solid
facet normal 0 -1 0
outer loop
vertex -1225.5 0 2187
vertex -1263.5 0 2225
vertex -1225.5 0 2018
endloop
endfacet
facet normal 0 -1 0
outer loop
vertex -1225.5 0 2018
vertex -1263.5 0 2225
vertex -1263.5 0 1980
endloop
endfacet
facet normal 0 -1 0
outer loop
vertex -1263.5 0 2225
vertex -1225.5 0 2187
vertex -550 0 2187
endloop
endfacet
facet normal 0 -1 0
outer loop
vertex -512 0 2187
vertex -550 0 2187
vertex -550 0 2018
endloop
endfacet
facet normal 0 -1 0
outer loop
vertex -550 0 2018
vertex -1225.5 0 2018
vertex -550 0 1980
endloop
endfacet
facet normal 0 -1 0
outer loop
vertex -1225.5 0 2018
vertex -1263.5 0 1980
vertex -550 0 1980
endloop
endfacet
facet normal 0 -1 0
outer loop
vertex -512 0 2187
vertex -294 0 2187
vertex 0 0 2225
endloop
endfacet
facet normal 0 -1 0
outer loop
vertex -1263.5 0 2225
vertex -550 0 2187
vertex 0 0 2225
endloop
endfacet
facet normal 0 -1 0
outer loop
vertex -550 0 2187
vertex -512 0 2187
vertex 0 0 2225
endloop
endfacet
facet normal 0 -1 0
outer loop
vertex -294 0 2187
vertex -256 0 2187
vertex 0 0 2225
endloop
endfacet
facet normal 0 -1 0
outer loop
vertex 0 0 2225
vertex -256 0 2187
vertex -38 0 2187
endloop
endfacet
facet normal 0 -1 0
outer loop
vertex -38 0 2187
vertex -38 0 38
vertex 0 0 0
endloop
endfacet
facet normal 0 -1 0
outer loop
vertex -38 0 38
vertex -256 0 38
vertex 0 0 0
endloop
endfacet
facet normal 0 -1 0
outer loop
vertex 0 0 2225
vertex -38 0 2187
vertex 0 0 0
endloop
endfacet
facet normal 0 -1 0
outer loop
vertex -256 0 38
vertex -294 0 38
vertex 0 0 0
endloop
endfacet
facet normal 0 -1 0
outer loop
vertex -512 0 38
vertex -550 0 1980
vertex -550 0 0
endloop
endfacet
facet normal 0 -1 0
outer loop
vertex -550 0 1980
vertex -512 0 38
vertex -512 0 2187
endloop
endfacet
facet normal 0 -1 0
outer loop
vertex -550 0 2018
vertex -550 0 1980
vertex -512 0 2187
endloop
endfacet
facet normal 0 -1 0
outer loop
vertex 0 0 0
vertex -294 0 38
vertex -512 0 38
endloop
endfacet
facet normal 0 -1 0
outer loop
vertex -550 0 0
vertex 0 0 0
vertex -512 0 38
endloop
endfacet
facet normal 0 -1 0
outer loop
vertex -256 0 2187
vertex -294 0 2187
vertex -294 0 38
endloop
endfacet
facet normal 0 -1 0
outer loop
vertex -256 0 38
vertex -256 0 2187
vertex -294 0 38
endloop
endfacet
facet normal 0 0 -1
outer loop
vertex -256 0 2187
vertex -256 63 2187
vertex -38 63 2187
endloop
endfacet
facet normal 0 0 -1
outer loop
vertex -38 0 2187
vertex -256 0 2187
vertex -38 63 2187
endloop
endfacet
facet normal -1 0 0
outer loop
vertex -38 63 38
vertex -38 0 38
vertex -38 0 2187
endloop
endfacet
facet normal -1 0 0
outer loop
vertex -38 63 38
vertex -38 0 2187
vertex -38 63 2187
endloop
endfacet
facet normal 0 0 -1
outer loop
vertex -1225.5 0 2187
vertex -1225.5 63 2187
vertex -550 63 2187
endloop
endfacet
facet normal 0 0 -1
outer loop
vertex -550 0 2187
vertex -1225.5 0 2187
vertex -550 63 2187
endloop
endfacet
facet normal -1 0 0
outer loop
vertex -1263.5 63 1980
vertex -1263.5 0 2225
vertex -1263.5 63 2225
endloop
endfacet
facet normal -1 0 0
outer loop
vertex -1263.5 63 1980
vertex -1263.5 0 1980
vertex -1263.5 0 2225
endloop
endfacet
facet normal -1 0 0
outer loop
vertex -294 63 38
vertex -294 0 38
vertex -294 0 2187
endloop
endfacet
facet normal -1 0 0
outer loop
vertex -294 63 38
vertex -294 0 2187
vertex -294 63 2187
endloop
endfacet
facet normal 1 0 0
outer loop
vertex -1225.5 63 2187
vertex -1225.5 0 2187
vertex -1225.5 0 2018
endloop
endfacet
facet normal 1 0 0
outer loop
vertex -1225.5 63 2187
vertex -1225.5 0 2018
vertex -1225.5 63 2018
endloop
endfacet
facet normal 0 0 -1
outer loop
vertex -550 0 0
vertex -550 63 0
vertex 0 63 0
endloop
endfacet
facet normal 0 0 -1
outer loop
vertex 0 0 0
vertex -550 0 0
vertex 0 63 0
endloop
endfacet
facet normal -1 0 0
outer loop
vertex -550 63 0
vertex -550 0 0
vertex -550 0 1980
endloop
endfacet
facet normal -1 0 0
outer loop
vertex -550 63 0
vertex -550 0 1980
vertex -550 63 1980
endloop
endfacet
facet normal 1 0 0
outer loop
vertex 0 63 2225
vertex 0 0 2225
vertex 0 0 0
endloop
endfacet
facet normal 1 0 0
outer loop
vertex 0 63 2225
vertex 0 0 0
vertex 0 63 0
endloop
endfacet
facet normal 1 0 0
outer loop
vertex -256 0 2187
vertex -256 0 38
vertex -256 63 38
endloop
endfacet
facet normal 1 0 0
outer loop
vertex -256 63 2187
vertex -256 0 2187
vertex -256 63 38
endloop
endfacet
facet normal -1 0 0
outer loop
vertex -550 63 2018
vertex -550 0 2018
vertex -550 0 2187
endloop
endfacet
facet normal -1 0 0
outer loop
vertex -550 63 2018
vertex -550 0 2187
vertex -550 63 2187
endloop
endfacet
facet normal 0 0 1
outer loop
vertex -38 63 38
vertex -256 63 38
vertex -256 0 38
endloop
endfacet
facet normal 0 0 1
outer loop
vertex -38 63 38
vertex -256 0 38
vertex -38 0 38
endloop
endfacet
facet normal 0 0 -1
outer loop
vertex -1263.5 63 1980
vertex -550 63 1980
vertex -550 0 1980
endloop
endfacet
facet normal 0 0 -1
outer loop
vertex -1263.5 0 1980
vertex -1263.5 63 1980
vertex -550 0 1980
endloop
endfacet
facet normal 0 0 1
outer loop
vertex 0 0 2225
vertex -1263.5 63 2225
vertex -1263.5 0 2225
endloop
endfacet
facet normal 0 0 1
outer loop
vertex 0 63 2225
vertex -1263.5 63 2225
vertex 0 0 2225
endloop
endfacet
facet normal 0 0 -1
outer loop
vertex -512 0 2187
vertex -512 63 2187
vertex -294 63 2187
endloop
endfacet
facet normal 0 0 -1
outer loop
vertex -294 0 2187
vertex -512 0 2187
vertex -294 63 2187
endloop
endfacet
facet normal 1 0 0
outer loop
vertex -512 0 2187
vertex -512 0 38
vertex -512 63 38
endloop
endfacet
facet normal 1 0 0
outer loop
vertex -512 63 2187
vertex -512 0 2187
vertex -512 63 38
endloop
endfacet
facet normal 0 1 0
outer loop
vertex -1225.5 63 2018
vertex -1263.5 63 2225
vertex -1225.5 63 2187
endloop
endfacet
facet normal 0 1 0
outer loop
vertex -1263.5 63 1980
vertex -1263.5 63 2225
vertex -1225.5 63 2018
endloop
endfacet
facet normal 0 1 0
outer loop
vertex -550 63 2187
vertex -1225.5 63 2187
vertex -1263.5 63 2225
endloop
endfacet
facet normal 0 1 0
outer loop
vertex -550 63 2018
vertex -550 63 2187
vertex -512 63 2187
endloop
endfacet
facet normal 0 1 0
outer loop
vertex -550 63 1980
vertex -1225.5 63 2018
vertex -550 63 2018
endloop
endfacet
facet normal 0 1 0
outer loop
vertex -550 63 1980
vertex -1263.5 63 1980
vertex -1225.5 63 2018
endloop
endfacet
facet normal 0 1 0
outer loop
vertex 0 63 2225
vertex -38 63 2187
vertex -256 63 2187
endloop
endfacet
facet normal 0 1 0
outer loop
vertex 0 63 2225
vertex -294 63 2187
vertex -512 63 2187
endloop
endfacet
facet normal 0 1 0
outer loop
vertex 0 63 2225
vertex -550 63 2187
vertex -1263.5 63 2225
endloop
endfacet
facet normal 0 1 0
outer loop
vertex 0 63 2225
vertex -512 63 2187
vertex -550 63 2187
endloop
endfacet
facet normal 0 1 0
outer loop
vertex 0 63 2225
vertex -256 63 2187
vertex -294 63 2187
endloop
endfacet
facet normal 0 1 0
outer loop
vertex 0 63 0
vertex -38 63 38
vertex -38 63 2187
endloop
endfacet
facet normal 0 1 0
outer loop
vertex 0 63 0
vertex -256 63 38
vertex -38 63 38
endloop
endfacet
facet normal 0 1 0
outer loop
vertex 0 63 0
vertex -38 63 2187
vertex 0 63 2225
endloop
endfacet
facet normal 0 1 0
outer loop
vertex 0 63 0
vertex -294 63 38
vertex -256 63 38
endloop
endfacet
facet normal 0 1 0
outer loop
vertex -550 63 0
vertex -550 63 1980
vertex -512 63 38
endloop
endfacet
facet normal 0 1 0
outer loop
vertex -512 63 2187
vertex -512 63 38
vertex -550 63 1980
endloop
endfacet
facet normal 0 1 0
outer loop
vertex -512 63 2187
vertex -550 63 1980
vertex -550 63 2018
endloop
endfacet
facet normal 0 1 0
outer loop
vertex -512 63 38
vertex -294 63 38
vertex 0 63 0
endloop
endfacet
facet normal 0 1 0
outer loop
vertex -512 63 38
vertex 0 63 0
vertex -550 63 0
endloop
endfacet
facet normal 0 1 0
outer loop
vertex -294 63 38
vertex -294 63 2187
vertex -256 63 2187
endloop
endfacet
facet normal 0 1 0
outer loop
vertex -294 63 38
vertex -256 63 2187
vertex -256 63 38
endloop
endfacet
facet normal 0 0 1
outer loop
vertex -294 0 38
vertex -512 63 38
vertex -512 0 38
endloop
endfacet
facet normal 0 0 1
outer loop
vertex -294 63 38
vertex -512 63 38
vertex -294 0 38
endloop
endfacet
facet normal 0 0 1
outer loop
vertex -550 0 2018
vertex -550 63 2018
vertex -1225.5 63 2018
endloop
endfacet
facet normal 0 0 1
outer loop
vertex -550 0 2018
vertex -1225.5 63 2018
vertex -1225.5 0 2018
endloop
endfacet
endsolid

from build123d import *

# Parameters (mm, degrees)
F0_W      = 550
F0_H      = 63
F1_DEPTH  = 38
F2_W      = 38
F2_H      = 63
F3_DEPTH  = 2149
F4_W      = 38
F4_H      = 63
F5_DEPTH  = 2149
F6_W      = 38
F6_H      = 63
F7_DEPTH  = 2149
F8_W      = 1263.5
F8_H      = 63
F9_DEPTH  = 38
F10_W     = 63
F10_H     = 38
F11_DEPTH = 713.5
F12_W     = 38
F12_H     = 63
F13_DEPTH = 169


with BuildPart() as f1:
    # F0 (on Top) → F1 (new body)
    with BuildSketch(Plane.XY):
        with Locations((-275, 31.5)):
            Rectangle(F0_W, F0_H)
    extrude(amount=F1_DEPTH)

    # F2 (on face) → F3 (join)
    with BuildSketch(Plane.XY.offset(38)):
        with Locations((-531, 31.5)):
            Rectangle(F2_W, F2_H)
    extrude(amount=F3_DEPTH)

    # F4 (on face) → F5 (join)
    with BuildSketch(Plane.XY.offset(38)):
        with Locations((-19, 31.5)):
            Rectangle(F4_W, F4_H)
    extrude(amount=F5_DEPTH)

    # F6 (on face) → F7 (join)
    with BuildSketch(Plane.XY.offset(38)):
        with Locations((-275, 31.5)):
            Rectangle(F6_W, F6_H)
    extrude(amount=F7_DEPTH)

    # F8 (on face) → F9 (join)
    with BuildSketch(Plane.XY.offset(2187)):
        with Locations((-631.75, 31.5)):
            Rectangle(F8_W, F8_H)
    extrude(amount=F9_DEPTH)

    # F10 (on face) → F11 (join)
    with BuildSketch(Plane(origin=(-550, 0, 0), x_dir=(0, -1, 0), z_dir=(-1, 0, 0))):
        with Locations((-31.5, 1999)):
            Rectangle(F10_W, F10_H)
    extrude(amount=F11_DEPTH)

    # F12 (on face) → F13 (join)
    with BuildSketch(Plane.XY.offset(2018)):
        with Locations((-1244.5, 31.5)):
            Rectangle(F12_W, F12_H)
    extrude(amount=F13_DEPTH)


solid = f1.part
